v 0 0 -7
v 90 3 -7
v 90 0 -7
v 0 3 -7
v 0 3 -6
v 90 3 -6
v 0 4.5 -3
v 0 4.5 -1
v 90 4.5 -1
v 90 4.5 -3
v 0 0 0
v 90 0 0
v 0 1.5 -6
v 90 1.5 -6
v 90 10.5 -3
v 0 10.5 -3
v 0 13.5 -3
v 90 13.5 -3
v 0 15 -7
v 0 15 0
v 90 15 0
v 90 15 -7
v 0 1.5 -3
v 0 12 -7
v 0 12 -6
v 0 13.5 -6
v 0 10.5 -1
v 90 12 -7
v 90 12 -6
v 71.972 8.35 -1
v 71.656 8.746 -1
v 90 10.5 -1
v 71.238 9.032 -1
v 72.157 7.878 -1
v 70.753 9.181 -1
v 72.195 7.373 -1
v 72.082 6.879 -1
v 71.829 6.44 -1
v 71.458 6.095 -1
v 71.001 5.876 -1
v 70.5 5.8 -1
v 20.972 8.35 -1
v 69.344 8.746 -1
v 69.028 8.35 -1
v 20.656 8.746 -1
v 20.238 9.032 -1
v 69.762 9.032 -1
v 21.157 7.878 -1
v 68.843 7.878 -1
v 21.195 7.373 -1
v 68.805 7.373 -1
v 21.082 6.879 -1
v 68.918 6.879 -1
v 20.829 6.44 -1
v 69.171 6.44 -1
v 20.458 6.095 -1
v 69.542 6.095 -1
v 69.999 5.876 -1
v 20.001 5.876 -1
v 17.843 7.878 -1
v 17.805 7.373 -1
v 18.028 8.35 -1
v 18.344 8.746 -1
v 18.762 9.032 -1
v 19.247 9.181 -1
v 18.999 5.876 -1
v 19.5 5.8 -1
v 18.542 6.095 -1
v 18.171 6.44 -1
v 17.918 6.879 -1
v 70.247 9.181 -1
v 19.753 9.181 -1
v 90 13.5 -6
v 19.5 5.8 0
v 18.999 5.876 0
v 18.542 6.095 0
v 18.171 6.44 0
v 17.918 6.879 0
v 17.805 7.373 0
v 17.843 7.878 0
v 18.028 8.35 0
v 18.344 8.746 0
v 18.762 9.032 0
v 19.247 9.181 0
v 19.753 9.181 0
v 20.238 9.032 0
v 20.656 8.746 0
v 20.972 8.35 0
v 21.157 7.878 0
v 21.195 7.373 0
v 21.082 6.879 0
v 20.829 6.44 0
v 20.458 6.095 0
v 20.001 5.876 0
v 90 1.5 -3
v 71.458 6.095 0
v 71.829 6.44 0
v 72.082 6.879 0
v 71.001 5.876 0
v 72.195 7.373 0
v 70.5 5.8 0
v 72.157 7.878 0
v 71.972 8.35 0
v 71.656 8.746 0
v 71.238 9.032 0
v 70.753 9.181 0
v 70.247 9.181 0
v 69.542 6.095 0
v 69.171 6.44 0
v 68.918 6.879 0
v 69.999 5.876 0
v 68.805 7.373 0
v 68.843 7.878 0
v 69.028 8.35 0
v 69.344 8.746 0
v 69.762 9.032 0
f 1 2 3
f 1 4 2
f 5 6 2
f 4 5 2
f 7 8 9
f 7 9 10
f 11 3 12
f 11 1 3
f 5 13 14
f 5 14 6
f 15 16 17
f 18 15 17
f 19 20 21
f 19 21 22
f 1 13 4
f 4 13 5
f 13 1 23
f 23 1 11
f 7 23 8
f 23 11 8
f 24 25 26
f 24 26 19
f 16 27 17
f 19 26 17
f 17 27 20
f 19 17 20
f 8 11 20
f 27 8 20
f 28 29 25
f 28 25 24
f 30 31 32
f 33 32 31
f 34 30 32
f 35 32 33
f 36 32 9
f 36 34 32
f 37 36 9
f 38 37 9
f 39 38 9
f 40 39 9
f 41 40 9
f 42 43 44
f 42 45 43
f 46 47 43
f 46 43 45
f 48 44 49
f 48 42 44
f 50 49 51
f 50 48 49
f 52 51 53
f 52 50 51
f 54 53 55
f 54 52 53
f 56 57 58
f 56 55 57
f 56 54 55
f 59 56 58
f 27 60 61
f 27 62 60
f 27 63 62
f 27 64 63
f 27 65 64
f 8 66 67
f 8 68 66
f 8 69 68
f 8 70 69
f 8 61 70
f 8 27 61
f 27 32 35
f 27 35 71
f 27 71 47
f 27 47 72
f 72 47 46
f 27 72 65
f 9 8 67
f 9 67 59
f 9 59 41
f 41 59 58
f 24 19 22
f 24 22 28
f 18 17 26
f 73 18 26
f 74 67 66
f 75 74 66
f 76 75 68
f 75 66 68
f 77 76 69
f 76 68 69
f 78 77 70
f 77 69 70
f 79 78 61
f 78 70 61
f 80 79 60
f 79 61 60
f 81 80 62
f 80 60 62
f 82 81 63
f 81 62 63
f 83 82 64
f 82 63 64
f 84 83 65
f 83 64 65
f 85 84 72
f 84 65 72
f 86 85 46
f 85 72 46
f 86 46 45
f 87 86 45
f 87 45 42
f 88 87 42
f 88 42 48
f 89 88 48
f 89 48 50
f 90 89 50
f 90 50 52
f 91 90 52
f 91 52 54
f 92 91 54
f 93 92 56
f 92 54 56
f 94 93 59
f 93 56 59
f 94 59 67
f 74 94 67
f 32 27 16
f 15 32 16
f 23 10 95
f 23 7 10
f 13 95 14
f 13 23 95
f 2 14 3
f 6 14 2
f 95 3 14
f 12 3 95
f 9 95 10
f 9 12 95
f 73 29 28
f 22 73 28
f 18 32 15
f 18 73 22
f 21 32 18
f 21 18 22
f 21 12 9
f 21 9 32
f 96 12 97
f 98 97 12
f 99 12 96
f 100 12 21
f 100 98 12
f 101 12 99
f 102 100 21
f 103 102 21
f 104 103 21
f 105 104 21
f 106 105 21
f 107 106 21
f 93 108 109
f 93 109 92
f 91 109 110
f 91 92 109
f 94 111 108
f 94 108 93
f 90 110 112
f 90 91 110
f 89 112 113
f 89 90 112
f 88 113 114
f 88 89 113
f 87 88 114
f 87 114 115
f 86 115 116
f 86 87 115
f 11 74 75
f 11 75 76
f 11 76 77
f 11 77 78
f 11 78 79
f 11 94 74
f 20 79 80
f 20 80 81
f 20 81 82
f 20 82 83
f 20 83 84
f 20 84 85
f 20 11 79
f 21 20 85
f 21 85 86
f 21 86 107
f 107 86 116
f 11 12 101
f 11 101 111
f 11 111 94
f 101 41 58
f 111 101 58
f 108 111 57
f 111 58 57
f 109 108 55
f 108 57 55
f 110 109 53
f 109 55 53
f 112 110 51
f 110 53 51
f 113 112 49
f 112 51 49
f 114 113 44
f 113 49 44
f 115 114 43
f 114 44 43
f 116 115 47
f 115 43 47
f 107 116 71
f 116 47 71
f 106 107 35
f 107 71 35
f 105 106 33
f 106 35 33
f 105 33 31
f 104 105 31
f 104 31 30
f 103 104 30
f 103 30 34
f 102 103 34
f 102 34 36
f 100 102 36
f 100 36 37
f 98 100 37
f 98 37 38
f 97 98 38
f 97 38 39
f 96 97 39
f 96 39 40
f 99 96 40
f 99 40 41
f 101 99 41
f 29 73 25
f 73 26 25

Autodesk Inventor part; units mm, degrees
ref_plane "YZ Plane" through (0, 0, 0) normal (1, 0, 0) x (0, 1, 0)
ref_plane "XZ Plane" through (0, 0, 0) normal (0, 1, 0) x (-1, 0, 0)
ref_plane "XY Plane" through (0, 0, 0) normal (0, 0, 1) x (1, 0, 0)
sketch "スケッチ1" plane through (0, 0, 0) normal (1, 0, 0) x (0, 1, 0)
  line L0 (0, 0) -> (15, 0)
  line L1 (15, 0) -> (15, -7)
  line L2 (0, -7) -> (0, 0)
  line L3 (7.5, 0) -> (7.5, -7)
  line L4 (7.5, -1) -> (10.5, -1)
  line L5 (10.5, -1) -> (10.5, -3)
  line L6 (10.5, -3) -> (13.5, -3)
  line L7 (13.5, -3) -> (13.5, -6)
  line L8 (13.5, -6) -> (12, -6)
  line L9 (12, -6) -> (12, -7)
  line L10 (7.5, -1) -> (4.5, -1)
  line L11 (4.5, -1) -> (4.5, -3)
  line L12 (4.5, -3) -> (1.5, -3)
  line L13 (1.5, -3) -> (1.5, -6)
  line L14 (1.5, -6) -> (3, -6)
  line L15 (3, -6) -> (3, -7)
  line L16 (15, -7) -> (12, -7)
  line L17 (3, -7) -> (0, -7)
  dimension "d0" = 15
  dimension "d1" = 7
  dimension "d2" = 3
  dimension "d3" = 2
  dimension "d5" = 3
  dimension "d6" = 3
  dimension "d7" = 1.5
  dimension "d9" = 1
extrude "押し出し1" add sketch "スケッチ1" along normal blind 90
sketch "スケッチ2" plane through (0, 0, 0) normal (0, 0, 1) x (1, 0, 0)
  line L0 (0, 4.5) -> (0, 10.5) projected
  line L1 (0, 7.5) -> (90, 7.5)
  line L2 (90, 4.5) -> (90, 10.5) projected
  line L3 (0, 15) -> (0, 0) projected
  line L4 (90, 15) -> (90, 0) projected
  point P0 (19.5, 7.5)
  point P1 (70.5, 7.5)
  dimension "d12" = 19.5
  dimension "d20" = 19.5
hole "穴1" at (19.5, 7.5, 0) at (70.5, 7.5, 0) direction (0, 0, -1) diameter 3.4 end through all
equation "\"d20\" = d12"
properties part number "slider2a2" material "アルミニウム 6061-AHC"
